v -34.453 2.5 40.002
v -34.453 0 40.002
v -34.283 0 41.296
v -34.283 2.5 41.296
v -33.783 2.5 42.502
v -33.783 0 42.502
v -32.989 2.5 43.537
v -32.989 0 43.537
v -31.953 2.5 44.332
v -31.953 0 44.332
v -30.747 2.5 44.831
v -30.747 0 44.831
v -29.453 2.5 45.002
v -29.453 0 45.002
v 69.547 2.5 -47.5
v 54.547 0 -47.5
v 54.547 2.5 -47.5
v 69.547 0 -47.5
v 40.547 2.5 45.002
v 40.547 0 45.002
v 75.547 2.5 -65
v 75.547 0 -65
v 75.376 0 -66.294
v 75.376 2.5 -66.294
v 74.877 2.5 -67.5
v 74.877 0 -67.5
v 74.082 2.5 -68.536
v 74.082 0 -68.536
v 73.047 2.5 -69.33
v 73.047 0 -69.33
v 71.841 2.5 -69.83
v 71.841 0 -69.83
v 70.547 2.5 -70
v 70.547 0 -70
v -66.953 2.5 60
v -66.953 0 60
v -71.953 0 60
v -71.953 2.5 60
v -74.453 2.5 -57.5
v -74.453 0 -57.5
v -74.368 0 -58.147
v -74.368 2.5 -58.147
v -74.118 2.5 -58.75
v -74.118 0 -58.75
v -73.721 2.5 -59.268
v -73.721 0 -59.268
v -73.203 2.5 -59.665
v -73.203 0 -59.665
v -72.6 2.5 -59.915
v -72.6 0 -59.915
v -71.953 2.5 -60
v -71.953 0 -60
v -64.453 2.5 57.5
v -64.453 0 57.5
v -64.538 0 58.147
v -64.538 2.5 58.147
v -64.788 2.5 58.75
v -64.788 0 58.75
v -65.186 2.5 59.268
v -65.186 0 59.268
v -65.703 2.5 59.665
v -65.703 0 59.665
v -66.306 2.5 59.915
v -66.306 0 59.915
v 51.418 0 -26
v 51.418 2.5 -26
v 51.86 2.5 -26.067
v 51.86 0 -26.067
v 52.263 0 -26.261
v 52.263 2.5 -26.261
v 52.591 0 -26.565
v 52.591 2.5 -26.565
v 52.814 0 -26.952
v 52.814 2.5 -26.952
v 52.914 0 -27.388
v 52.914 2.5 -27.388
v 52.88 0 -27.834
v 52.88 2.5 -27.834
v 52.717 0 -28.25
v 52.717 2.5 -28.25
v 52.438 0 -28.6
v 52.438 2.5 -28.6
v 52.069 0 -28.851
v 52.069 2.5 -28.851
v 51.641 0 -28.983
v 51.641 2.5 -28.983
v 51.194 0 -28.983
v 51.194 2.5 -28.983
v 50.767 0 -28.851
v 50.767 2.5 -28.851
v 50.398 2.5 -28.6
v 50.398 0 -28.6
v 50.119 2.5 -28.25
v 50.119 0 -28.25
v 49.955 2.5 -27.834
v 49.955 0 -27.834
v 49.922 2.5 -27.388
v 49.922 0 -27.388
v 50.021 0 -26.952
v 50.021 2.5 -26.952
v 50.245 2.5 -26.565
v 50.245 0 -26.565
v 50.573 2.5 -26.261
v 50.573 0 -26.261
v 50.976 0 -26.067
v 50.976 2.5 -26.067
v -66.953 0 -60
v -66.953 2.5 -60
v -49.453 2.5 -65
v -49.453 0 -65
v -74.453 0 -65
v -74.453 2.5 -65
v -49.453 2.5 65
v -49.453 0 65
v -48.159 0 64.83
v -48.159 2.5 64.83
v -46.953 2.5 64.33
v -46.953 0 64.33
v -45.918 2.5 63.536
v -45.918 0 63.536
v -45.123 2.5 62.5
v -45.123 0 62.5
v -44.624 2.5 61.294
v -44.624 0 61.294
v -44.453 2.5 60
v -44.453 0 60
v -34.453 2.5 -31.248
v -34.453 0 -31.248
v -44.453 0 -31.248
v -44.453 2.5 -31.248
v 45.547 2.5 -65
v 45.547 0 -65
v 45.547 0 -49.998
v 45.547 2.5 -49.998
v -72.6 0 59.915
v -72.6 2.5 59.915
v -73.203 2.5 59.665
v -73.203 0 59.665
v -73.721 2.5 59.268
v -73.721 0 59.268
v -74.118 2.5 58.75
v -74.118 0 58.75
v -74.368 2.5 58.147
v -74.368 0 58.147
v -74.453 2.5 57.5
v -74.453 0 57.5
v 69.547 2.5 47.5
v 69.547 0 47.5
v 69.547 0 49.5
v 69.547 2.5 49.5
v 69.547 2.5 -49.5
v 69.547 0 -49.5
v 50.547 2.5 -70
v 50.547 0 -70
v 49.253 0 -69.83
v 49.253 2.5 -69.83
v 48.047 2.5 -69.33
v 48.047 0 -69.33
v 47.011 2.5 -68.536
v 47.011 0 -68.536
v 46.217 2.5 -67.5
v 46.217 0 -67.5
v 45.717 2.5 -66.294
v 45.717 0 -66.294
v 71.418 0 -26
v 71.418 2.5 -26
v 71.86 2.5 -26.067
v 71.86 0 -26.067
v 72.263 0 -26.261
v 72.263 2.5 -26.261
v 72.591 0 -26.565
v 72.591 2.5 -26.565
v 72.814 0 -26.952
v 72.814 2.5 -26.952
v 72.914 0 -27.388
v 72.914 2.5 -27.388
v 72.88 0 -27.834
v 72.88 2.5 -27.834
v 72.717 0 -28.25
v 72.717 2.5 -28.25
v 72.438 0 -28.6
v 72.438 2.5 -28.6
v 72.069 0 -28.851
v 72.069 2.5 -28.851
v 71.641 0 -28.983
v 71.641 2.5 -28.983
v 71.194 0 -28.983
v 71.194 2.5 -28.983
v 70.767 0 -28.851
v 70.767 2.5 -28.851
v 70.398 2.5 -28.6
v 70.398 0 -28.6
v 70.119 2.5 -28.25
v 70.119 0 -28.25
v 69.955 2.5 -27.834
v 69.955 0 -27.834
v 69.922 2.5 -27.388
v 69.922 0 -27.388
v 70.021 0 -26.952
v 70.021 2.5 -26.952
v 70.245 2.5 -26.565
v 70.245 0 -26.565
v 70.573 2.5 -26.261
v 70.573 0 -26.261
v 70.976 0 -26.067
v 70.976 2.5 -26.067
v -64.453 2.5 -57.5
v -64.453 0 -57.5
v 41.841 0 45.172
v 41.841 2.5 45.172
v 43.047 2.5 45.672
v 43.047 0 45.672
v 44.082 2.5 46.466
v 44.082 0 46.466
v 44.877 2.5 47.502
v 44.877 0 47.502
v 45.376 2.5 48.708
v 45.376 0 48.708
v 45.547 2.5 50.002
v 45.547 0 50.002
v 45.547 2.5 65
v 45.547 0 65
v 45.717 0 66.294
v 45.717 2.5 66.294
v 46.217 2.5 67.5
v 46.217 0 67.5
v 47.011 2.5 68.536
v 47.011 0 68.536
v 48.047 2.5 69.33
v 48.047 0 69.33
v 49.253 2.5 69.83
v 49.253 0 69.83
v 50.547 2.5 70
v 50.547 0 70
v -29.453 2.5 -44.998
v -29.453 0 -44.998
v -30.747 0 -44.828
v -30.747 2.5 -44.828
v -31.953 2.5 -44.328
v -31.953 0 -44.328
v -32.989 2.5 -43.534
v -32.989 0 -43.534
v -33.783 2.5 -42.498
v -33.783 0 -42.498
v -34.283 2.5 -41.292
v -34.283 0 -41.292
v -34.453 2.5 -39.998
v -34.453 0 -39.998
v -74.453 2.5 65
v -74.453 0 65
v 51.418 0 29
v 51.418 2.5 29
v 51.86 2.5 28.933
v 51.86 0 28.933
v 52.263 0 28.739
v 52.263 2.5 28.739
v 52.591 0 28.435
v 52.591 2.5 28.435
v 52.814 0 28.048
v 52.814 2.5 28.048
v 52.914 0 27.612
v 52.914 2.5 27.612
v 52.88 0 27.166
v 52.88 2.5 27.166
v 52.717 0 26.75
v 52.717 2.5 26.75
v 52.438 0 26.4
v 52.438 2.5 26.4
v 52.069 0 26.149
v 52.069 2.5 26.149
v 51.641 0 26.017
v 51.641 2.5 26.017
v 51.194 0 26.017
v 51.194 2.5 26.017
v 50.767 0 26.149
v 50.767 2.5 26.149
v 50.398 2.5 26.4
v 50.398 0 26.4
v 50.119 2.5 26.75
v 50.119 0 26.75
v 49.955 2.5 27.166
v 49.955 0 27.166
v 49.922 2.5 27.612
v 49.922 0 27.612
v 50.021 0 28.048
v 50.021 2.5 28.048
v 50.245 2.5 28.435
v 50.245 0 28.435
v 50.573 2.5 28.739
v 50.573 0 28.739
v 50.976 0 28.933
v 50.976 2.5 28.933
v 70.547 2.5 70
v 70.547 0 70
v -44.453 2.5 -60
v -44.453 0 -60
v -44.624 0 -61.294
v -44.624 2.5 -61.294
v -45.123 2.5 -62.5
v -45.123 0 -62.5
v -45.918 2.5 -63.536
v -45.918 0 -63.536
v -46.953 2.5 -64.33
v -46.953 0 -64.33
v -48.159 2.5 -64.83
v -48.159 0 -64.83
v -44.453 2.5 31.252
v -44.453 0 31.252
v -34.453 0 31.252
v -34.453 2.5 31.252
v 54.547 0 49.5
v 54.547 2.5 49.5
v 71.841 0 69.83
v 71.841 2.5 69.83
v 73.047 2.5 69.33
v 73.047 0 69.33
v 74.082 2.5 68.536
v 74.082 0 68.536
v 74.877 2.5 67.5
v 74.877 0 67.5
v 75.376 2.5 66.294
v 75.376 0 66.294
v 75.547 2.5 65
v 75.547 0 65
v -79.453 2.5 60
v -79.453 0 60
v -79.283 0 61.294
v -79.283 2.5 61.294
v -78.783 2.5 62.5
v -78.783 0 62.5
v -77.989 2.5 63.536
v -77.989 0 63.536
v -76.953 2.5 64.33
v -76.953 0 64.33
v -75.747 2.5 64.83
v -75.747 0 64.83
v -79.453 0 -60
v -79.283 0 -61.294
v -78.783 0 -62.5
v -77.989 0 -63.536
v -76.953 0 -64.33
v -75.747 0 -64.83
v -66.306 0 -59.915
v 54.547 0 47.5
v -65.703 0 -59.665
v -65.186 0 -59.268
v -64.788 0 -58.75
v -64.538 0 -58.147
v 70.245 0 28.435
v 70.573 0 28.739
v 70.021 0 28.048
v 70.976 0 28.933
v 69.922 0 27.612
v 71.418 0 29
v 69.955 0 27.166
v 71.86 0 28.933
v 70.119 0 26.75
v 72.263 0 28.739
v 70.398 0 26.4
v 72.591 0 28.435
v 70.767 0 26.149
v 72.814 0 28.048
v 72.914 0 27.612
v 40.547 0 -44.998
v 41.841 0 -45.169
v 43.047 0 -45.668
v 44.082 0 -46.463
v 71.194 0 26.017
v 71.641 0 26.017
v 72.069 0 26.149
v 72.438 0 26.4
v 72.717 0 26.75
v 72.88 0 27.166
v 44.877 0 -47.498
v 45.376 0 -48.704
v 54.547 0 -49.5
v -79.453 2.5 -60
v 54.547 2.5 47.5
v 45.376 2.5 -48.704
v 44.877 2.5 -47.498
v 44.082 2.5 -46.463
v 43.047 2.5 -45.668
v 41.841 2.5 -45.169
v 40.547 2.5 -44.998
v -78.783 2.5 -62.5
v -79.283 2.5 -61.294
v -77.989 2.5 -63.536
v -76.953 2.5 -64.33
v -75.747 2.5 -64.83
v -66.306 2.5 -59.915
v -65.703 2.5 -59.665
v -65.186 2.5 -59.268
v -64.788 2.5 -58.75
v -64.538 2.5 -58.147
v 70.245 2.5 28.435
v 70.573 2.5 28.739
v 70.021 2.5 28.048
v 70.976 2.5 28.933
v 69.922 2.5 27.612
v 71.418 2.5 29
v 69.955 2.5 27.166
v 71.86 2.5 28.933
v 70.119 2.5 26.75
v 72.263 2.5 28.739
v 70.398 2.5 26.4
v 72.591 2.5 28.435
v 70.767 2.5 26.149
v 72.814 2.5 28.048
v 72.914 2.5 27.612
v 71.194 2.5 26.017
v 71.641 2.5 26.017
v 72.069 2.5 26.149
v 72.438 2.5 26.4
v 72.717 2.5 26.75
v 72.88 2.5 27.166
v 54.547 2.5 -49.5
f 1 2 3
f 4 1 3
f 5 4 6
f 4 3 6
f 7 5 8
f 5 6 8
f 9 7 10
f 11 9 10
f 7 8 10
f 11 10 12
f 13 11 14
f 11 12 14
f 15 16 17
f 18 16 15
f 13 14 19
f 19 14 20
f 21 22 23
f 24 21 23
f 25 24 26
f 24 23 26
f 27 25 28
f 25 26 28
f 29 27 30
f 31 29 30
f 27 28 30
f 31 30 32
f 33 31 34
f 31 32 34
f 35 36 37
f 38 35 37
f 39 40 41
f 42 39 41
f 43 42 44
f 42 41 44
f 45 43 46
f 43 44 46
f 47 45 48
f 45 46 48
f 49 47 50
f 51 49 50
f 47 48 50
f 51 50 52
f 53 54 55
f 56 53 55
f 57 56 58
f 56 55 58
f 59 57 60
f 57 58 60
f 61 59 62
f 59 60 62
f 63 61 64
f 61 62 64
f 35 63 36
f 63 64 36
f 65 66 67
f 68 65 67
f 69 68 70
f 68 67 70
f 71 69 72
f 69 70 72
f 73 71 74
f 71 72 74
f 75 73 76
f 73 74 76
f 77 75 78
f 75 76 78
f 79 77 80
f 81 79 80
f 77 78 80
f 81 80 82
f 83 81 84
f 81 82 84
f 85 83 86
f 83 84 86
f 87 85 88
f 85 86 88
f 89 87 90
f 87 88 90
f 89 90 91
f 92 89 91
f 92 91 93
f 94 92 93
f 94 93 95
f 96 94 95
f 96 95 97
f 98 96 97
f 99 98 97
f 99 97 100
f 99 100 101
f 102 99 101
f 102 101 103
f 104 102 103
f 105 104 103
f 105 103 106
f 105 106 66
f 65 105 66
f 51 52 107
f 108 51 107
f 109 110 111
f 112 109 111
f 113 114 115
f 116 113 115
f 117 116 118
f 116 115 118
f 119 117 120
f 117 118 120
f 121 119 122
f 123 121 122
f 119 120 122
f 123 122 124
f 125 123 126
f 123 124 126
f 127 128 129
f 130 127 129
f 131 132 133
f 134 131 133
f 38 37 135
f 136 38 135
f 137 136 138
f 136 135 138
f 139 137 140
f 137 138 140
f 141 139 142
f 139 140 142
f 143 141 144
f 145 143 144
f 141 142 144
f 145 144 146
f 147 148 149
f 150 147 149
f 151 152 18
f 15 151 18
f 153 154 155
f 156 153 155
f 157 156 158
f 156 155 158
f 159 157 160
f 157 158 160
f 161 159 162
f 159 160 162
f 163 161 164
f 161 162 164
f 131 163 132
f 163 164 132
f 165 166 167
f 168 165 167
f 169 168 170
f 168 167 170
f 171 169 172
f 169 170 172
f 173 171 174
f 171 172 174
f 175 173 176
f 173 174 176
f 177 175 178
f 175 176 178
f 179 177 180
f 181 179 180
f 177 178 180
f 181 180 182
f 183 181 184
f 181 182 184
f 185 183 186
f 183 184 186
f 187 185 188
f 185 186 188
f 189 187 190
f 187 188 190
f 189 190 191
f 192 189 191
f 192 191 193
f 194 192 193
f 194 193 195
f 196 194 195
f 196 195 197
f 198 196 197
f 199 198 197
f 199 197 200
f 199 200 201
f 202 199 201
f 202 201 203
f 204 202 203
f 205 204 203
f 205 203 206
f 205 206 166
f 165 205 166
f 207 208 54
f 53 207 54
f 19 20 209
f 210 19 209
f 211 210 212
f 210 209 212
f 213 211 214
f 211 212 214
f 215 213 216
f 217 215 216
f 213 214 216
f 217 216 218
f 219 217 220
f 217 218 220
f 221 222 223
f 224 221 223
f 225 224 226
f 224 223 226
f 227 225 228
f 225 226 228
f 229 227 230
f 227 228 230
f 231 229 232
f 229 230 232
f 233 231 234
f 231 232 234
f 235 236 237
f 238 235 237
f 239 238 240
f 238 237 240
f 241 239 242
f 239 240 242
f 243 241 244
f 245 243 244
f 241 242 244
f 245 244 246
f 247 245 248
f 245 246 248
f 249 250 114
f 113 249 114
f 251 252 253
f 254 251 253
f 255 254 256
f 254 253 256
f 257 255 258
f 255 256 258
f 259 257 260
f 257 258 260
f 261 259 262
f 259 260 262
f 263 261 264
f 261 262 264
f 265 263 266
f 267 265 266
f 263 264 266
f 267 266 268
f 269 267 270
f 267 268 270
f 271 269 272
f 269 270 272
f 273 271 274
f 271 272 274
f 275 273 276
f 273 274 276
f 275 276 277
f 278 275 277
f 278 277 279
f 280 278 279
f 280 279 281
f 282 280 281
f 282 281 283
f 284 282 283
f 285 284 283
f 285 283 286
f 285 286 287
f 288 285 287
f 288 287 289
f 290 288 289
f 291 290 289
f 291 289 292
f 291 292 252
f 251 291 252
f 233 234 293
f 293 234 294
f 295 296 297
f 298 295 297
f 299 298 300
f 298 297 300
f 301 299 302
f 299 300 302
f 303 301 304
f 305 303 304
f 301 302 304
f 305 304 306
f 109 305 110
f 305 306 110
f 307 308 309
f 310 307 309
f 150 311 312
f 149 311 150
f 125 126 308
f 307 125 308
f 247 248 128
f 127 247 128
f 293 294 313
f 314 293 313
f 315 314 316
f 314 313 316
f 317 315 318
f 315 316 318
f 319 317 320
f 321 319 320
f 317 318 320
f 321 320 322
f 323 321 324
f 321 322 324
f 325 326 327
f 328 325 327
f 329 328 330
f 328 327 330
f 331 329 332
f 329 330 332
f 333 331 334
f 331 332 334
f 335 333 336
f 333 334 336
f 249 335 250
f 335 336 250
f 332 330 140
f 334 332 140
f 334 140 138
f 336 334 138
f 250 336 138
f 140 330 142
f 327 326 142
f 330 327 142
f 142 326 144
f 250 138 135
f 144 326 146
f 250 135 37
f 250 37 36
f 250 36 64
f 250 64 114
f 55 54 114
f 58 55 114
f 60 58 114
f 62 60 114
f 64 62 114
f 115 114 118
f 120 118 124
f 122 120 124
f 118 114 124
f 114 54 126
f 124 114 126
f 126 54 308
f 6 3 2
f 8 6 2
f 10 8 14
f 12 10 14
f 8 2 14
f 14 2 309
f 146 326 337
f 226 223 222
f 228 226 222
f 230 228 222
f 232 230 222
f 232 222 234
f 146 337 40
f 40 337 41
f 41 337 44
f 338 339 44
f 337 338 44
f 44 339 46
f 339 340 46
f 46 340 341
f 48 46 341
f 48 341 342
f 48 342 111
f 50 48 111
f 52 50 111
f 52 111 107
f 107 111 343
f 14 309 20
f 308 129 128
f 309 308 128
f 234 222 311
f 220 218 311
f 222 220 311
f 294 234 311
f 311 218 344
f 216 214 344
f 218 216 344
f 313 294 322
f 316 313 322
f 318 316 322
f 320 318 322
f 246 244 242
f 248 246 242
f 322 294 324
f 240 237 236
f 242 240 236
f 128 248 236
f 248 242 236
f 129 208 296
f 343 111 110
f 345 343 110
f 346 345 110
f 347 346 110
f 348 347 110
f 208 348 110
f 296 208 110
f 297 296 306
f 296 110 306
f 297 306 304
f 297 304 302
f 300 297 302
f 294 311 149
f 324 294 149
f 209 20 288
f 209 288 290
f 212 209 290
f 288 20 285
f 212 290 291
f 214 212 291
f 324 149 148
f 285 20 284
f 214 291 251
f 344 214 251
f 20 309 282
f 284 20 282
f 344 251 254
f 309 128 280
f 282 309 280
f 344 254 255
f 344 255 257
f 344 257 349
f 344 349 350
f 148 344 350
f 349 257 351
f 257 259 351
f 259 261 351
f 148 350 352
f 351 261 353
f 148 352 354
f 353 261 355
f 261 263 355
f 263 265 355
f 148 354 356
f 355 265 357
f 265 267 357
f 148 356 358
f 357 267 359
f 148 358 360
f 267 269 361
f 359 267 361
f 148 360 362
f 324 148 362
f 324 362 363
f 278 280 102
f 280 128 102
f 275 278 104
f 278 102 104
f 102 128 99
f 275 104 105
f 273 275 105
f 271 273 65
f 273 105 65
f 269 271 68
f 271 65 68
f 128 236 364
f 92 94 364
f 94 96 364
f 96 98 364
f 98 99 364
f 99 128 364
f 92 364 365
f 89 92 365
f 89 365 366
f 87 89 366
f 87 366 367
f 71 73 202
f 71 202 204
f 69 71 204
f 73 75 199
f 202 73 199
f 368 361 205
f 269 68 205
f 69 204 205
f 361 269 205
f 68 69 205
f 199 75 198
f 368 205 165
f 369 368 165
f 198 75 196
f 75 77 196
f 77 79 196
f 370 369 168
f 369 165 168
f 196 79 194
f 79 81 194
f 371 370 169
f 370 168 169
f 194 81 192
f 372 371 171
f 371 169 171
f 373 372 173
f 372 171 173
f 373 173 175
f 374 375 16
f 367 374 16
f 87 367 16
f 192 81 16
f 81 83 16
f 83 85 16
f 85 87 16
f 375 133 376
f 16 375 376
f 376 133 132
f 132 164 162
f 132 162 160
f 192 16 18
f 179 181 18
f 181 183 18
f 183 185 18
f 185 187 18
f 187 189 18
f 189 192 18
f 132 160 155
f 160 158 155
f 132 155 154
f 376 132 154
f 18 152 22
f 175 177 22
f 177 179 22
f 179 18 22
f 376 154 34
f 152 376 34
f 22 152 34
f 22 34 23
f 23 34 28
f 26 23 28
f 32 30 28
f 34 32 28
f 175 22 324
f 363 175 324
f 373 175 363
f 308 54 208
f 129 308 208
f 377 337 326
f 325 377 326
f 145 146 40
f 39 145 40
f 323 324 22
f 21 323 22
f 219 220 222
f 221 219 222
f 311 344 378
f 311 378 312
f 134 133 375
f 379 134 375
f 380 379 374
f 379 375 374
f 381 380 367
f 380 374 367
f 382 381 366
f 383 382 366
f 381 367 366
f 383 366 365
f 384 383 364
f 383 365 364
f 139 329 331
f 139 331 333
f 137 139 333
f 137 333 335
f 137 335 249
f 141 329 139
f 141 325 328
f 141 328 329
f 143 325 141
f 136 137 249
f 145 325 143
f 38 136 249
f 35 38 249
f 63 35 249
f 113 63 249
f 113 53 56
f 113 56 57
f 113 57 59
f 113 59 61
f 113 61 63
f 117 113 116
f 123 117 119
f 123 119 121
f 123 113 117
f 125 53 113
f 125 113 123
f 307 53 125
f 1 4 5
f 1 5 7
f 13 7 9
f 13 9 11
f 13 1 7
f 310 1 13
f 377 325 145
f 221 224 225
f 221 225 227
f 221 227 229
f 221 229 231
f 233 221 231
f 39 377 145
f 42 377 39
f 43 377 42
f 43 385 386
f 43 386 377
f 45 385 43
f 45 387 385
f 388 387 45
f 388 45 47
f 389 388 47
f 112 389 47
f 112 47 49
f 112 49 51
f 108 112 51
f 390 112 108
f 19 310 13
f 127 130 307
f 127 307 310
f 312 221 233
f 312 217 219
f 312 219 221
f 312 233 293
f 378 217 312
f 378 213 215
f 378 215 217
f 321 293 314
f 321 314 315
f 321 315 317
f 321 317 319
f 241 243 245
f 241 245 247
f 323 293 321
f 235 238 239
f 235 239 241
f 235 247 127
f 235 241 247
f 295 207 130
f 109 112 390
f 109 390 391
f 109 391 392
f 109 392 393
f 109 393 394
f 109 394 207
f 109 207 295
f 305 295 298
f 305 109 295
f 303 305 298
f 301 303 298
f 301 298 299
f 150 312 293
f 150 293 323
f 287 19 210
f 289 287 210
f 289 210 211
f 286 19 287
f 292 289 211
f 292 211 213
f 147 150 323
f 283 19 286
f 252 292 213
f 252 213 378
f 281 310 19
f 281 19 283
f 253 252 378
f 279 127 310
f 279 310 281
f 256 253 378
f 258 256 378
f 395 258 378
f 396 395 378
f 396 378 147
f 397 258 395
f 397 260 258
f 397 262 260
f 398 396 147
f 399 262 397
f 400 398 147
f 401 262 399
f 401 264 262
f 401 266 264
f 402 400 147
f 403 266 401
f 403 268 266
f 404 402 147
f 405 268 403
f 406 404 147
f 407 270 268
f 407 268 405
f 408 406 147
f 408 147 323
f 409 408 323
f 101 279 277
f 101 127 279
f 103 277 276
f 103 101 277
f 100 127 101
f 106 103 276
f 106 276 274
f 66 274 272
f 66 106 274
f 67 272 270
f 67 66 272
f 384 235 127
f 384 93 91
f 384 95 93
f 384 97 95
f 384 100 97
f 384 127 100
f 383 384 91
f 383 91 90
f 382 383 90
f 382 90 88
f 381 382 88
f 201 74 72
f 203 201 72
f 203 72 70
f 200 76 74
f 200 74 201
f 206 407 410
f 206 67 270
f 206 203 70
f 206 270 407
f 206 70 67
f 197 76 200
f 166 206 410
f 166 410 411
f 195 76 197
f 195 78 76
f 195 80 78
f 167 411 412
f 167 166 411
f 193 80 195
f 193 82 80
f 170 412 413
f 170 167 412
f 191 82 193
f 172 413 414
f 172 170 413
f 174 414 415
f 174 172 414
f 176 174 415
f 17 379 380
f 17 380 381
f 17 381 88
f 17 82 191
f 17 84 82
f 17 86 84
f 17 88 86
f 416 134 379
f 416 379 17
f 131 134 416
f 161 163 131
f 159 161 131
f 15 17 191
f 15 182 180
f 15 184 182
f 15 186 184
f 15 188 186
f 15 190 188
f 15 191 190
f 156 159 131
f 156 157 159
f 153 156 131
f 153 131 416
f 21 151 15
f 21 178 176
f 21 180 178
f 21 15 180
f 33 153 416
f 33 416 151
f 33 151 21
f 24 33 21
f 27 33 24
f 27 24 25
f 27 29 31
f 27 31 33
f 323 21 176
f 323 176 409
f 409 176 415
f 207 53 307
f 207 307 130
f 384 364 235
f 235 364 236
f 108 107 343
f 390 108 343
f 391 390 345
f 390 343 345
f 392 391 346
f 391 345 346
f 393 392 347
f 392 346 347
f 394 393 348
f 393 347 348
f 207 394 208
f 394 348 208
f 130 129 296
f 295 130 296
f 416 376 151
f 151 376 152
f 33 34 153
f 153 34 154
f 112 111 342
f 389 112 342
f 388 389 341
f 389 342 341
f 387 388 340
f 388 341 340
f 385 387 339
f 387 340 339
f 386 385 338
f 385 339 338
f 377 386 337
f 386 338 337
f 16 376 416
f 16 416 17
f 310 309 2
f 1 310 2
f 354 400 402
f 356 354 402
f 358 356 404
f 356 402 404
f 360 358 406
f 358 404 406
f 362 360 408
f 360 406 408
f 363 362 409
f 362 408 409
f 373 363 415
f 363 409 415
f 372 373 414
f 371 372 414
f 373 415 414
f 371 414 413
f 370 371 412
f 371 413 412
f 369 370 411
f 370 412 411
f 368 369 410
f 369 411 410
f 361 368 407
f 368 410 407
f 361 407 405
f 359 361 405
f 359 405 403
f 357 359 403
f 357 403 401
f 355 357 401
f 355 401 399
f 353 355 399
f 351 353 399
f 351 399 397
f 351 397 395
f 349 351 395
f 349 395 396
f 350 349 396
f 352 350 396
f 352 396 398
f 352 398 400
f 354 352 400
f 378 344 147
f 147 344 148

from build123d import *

# Parameters (mm, degrees)
BOSS_EXTRUDE1_DEPTH = 2.5
SKETCH2_R           = 1.5
CUT_EXTRUDE1_DEPTH  = 106.920143167
SKETCH4_W           = 15
SKETCH4_H           = 2
CUT_EXTRUDE2_DEPTH  = 2.5


with BuildPart() as part:
    # Sketch1 → Boss-Extrude1 (new body)
    with BuildSketch(Plane(origin=(0, 0, 0), x_dir=(1, 0, 0), z_dir=(0, 1, 0))):
        with BuildLine():
            Line((45.546700959, 65), (45.546700959, 49.998256331))
            ThreePointArc((45.546700959, 49.998256331), (44.082234865, 46.462722425), (40.546700959, 44.998256331))
            Line((40.546700959, 44.998256331), (-29.453299041, 44.998256331))
            ThreePointArc((-29.453299041, 44.998256331), (-32.988832947, 43.533790237), (-34.453299041, 39.998256331))
            Line((-34.453299041, 39.998256331), (-34.453299041, 31.248256331))
            Line((-34.453299041, 31.248256331), (-44.453299041, 31.248256331))
            Line((-44.453299041, 31.248256331), (-44.453299041, 46.248256331))
            Line((-44.453299041, 46.248256331), (-44.453299041, 60))
            ThreePointArc((-44.453299041, 60), (-45.917765135, 63.535533906), (-49.453299041, 65))
            Line((-49.453299041, 65), (-74.453299041, 65))
            ThreePointArc((-74.453299041, 65), (-77.988832947, 63.535533906), (-79.453299041, 60))
            Line((-79.453299041, 60), (-79.453299041, -60))
            ThreePointArc((-79.453299041, -60), (-77.988832947, -63.535533906), (-74.453299041, -65))
            Line((-74.453299041, -65), (-49.453299041, -65))
            ThreePointArc((-49.453299041, -65), (-45.917765135, -63.535533906), (-44.453299041, -60))
            Line((-44.453299041, -60), (-44.453299041, -46.251743669))
            Line((-44.453299041, -46.251743669), (-44.453299041, -31.251743669))
            Line((-44.453299041, -31.251743669), (-34.453299041, -31.251743669))
            Line((-34.453299041, -31.251743669), (-34.453299041, -40.001743669))
            ThreePointArc((-34.453299041, -40.001743669), (-32.988832947, -43.537277575), (-29.453299041, -45.001743669))
            Line((-29.453299041, -45.001743669), (40.546700959, -45.001743669))
            ThreePointArc((40.546700959, -45.001743669), (44.082234865, -46.466209763), (45.546700959, -50.001743669))
            Line((45.546700959, -50.001743669), (45.546700959, -65))
            ThreePointArc((45.546700959, -65), (47.011167053, -68.535533906), (50.546700959, -70))
            Line((50.546700959, -70), (70.546700959, -70))
            ThreePointArc((70.546700959, -70), (74.082234865, -68.535533906), (75.546700959, -65))
            Line((75.546700959, -65), (75.546700959, 65))
            ThreePointArc((75.546700959, 65), (74.082234865, 68.535533906), (70.546700959, 70))
            Line((70.546700959, 70), (50.546700959, 70))
            ThreePointArc((50.546700959, 70), (47.011167053, 68.535533906), (45.546700959, 65))
        make_face()
        with BuildLine():
            Line((-71.953299041, 60), (-66.953299041, 60))
            ThreePointArc((-66.953299041, 60), (-65.185532088, 59.267766953), (-64.453299041, 57.5))
            Line((-64.453299041, 57.5), (-64.453299041, -57.5))
            ThreePointArc((-64.453299041, -57.5), (-65.185532088, -59.267766953), (-66.953299041, -60))
            Line((-66.953299041, -60), (-71.953299041, -60))
            ThreePointArc((-71.953299041, -60), (-73.721065994, -59.267766953), (-74.453299041, -57.5))
            Line((-74.453299041, -57.5), (-74.453299041, 57.5))
            ThreePointArc((-74.453299041, 57.5), (-73.721065994, 59.267766953), (-71.953299041, 60))
        make_face(mode=Mode.SUBTRACT)
    extrude(amount=BOSS_EXTRUDE1_DEPTH)

    # Sketch2 → Cut-Extrude1 (cut, through all)
    with BuildSketch(Plane(origin=(0, 2.5, 0), x_dir=(1, 0, 0), z_dir=(0, 1, 0))):
        with Locations(Location((51.417773874, 27.5, 0), (0, 0, 270))):
            Circle(SKETCH2_R)
        with Locations(Location((51.417773874, -27.5, 0), (0, 0, 270))):
            Circle(SKETCH2_R)
        with Locations(Location((71.417773874, -27.5, 0), (0, 0, 270))):
            Circle(SKETCH2_R)
        with Locations(Location((71.417773874, 27.5, 0), (0, 0, 270))):
            Circle(SKETCH2_R)
    extrude(amount=-CUT_EXTRUDE1_DEPTH, mode=Mode.SUBTRACT)

    # Sketch4 → Cut-Extrude2 (cut)
    with BuildSketch(Plane.XZ):
        with Locations((62.046700959, -48.5)):
            Rectangle(SKETCH4_W, SKETCH4_H)
        with Locations((62.046700959, 48.5)):
            Rectangle(SKETCH4_W, SKETCH4_H)
    extrude(amount=-CUT_EXTRUDE2_DEPTH, mode=Mode.SUBTRACT)


solid = part.part
